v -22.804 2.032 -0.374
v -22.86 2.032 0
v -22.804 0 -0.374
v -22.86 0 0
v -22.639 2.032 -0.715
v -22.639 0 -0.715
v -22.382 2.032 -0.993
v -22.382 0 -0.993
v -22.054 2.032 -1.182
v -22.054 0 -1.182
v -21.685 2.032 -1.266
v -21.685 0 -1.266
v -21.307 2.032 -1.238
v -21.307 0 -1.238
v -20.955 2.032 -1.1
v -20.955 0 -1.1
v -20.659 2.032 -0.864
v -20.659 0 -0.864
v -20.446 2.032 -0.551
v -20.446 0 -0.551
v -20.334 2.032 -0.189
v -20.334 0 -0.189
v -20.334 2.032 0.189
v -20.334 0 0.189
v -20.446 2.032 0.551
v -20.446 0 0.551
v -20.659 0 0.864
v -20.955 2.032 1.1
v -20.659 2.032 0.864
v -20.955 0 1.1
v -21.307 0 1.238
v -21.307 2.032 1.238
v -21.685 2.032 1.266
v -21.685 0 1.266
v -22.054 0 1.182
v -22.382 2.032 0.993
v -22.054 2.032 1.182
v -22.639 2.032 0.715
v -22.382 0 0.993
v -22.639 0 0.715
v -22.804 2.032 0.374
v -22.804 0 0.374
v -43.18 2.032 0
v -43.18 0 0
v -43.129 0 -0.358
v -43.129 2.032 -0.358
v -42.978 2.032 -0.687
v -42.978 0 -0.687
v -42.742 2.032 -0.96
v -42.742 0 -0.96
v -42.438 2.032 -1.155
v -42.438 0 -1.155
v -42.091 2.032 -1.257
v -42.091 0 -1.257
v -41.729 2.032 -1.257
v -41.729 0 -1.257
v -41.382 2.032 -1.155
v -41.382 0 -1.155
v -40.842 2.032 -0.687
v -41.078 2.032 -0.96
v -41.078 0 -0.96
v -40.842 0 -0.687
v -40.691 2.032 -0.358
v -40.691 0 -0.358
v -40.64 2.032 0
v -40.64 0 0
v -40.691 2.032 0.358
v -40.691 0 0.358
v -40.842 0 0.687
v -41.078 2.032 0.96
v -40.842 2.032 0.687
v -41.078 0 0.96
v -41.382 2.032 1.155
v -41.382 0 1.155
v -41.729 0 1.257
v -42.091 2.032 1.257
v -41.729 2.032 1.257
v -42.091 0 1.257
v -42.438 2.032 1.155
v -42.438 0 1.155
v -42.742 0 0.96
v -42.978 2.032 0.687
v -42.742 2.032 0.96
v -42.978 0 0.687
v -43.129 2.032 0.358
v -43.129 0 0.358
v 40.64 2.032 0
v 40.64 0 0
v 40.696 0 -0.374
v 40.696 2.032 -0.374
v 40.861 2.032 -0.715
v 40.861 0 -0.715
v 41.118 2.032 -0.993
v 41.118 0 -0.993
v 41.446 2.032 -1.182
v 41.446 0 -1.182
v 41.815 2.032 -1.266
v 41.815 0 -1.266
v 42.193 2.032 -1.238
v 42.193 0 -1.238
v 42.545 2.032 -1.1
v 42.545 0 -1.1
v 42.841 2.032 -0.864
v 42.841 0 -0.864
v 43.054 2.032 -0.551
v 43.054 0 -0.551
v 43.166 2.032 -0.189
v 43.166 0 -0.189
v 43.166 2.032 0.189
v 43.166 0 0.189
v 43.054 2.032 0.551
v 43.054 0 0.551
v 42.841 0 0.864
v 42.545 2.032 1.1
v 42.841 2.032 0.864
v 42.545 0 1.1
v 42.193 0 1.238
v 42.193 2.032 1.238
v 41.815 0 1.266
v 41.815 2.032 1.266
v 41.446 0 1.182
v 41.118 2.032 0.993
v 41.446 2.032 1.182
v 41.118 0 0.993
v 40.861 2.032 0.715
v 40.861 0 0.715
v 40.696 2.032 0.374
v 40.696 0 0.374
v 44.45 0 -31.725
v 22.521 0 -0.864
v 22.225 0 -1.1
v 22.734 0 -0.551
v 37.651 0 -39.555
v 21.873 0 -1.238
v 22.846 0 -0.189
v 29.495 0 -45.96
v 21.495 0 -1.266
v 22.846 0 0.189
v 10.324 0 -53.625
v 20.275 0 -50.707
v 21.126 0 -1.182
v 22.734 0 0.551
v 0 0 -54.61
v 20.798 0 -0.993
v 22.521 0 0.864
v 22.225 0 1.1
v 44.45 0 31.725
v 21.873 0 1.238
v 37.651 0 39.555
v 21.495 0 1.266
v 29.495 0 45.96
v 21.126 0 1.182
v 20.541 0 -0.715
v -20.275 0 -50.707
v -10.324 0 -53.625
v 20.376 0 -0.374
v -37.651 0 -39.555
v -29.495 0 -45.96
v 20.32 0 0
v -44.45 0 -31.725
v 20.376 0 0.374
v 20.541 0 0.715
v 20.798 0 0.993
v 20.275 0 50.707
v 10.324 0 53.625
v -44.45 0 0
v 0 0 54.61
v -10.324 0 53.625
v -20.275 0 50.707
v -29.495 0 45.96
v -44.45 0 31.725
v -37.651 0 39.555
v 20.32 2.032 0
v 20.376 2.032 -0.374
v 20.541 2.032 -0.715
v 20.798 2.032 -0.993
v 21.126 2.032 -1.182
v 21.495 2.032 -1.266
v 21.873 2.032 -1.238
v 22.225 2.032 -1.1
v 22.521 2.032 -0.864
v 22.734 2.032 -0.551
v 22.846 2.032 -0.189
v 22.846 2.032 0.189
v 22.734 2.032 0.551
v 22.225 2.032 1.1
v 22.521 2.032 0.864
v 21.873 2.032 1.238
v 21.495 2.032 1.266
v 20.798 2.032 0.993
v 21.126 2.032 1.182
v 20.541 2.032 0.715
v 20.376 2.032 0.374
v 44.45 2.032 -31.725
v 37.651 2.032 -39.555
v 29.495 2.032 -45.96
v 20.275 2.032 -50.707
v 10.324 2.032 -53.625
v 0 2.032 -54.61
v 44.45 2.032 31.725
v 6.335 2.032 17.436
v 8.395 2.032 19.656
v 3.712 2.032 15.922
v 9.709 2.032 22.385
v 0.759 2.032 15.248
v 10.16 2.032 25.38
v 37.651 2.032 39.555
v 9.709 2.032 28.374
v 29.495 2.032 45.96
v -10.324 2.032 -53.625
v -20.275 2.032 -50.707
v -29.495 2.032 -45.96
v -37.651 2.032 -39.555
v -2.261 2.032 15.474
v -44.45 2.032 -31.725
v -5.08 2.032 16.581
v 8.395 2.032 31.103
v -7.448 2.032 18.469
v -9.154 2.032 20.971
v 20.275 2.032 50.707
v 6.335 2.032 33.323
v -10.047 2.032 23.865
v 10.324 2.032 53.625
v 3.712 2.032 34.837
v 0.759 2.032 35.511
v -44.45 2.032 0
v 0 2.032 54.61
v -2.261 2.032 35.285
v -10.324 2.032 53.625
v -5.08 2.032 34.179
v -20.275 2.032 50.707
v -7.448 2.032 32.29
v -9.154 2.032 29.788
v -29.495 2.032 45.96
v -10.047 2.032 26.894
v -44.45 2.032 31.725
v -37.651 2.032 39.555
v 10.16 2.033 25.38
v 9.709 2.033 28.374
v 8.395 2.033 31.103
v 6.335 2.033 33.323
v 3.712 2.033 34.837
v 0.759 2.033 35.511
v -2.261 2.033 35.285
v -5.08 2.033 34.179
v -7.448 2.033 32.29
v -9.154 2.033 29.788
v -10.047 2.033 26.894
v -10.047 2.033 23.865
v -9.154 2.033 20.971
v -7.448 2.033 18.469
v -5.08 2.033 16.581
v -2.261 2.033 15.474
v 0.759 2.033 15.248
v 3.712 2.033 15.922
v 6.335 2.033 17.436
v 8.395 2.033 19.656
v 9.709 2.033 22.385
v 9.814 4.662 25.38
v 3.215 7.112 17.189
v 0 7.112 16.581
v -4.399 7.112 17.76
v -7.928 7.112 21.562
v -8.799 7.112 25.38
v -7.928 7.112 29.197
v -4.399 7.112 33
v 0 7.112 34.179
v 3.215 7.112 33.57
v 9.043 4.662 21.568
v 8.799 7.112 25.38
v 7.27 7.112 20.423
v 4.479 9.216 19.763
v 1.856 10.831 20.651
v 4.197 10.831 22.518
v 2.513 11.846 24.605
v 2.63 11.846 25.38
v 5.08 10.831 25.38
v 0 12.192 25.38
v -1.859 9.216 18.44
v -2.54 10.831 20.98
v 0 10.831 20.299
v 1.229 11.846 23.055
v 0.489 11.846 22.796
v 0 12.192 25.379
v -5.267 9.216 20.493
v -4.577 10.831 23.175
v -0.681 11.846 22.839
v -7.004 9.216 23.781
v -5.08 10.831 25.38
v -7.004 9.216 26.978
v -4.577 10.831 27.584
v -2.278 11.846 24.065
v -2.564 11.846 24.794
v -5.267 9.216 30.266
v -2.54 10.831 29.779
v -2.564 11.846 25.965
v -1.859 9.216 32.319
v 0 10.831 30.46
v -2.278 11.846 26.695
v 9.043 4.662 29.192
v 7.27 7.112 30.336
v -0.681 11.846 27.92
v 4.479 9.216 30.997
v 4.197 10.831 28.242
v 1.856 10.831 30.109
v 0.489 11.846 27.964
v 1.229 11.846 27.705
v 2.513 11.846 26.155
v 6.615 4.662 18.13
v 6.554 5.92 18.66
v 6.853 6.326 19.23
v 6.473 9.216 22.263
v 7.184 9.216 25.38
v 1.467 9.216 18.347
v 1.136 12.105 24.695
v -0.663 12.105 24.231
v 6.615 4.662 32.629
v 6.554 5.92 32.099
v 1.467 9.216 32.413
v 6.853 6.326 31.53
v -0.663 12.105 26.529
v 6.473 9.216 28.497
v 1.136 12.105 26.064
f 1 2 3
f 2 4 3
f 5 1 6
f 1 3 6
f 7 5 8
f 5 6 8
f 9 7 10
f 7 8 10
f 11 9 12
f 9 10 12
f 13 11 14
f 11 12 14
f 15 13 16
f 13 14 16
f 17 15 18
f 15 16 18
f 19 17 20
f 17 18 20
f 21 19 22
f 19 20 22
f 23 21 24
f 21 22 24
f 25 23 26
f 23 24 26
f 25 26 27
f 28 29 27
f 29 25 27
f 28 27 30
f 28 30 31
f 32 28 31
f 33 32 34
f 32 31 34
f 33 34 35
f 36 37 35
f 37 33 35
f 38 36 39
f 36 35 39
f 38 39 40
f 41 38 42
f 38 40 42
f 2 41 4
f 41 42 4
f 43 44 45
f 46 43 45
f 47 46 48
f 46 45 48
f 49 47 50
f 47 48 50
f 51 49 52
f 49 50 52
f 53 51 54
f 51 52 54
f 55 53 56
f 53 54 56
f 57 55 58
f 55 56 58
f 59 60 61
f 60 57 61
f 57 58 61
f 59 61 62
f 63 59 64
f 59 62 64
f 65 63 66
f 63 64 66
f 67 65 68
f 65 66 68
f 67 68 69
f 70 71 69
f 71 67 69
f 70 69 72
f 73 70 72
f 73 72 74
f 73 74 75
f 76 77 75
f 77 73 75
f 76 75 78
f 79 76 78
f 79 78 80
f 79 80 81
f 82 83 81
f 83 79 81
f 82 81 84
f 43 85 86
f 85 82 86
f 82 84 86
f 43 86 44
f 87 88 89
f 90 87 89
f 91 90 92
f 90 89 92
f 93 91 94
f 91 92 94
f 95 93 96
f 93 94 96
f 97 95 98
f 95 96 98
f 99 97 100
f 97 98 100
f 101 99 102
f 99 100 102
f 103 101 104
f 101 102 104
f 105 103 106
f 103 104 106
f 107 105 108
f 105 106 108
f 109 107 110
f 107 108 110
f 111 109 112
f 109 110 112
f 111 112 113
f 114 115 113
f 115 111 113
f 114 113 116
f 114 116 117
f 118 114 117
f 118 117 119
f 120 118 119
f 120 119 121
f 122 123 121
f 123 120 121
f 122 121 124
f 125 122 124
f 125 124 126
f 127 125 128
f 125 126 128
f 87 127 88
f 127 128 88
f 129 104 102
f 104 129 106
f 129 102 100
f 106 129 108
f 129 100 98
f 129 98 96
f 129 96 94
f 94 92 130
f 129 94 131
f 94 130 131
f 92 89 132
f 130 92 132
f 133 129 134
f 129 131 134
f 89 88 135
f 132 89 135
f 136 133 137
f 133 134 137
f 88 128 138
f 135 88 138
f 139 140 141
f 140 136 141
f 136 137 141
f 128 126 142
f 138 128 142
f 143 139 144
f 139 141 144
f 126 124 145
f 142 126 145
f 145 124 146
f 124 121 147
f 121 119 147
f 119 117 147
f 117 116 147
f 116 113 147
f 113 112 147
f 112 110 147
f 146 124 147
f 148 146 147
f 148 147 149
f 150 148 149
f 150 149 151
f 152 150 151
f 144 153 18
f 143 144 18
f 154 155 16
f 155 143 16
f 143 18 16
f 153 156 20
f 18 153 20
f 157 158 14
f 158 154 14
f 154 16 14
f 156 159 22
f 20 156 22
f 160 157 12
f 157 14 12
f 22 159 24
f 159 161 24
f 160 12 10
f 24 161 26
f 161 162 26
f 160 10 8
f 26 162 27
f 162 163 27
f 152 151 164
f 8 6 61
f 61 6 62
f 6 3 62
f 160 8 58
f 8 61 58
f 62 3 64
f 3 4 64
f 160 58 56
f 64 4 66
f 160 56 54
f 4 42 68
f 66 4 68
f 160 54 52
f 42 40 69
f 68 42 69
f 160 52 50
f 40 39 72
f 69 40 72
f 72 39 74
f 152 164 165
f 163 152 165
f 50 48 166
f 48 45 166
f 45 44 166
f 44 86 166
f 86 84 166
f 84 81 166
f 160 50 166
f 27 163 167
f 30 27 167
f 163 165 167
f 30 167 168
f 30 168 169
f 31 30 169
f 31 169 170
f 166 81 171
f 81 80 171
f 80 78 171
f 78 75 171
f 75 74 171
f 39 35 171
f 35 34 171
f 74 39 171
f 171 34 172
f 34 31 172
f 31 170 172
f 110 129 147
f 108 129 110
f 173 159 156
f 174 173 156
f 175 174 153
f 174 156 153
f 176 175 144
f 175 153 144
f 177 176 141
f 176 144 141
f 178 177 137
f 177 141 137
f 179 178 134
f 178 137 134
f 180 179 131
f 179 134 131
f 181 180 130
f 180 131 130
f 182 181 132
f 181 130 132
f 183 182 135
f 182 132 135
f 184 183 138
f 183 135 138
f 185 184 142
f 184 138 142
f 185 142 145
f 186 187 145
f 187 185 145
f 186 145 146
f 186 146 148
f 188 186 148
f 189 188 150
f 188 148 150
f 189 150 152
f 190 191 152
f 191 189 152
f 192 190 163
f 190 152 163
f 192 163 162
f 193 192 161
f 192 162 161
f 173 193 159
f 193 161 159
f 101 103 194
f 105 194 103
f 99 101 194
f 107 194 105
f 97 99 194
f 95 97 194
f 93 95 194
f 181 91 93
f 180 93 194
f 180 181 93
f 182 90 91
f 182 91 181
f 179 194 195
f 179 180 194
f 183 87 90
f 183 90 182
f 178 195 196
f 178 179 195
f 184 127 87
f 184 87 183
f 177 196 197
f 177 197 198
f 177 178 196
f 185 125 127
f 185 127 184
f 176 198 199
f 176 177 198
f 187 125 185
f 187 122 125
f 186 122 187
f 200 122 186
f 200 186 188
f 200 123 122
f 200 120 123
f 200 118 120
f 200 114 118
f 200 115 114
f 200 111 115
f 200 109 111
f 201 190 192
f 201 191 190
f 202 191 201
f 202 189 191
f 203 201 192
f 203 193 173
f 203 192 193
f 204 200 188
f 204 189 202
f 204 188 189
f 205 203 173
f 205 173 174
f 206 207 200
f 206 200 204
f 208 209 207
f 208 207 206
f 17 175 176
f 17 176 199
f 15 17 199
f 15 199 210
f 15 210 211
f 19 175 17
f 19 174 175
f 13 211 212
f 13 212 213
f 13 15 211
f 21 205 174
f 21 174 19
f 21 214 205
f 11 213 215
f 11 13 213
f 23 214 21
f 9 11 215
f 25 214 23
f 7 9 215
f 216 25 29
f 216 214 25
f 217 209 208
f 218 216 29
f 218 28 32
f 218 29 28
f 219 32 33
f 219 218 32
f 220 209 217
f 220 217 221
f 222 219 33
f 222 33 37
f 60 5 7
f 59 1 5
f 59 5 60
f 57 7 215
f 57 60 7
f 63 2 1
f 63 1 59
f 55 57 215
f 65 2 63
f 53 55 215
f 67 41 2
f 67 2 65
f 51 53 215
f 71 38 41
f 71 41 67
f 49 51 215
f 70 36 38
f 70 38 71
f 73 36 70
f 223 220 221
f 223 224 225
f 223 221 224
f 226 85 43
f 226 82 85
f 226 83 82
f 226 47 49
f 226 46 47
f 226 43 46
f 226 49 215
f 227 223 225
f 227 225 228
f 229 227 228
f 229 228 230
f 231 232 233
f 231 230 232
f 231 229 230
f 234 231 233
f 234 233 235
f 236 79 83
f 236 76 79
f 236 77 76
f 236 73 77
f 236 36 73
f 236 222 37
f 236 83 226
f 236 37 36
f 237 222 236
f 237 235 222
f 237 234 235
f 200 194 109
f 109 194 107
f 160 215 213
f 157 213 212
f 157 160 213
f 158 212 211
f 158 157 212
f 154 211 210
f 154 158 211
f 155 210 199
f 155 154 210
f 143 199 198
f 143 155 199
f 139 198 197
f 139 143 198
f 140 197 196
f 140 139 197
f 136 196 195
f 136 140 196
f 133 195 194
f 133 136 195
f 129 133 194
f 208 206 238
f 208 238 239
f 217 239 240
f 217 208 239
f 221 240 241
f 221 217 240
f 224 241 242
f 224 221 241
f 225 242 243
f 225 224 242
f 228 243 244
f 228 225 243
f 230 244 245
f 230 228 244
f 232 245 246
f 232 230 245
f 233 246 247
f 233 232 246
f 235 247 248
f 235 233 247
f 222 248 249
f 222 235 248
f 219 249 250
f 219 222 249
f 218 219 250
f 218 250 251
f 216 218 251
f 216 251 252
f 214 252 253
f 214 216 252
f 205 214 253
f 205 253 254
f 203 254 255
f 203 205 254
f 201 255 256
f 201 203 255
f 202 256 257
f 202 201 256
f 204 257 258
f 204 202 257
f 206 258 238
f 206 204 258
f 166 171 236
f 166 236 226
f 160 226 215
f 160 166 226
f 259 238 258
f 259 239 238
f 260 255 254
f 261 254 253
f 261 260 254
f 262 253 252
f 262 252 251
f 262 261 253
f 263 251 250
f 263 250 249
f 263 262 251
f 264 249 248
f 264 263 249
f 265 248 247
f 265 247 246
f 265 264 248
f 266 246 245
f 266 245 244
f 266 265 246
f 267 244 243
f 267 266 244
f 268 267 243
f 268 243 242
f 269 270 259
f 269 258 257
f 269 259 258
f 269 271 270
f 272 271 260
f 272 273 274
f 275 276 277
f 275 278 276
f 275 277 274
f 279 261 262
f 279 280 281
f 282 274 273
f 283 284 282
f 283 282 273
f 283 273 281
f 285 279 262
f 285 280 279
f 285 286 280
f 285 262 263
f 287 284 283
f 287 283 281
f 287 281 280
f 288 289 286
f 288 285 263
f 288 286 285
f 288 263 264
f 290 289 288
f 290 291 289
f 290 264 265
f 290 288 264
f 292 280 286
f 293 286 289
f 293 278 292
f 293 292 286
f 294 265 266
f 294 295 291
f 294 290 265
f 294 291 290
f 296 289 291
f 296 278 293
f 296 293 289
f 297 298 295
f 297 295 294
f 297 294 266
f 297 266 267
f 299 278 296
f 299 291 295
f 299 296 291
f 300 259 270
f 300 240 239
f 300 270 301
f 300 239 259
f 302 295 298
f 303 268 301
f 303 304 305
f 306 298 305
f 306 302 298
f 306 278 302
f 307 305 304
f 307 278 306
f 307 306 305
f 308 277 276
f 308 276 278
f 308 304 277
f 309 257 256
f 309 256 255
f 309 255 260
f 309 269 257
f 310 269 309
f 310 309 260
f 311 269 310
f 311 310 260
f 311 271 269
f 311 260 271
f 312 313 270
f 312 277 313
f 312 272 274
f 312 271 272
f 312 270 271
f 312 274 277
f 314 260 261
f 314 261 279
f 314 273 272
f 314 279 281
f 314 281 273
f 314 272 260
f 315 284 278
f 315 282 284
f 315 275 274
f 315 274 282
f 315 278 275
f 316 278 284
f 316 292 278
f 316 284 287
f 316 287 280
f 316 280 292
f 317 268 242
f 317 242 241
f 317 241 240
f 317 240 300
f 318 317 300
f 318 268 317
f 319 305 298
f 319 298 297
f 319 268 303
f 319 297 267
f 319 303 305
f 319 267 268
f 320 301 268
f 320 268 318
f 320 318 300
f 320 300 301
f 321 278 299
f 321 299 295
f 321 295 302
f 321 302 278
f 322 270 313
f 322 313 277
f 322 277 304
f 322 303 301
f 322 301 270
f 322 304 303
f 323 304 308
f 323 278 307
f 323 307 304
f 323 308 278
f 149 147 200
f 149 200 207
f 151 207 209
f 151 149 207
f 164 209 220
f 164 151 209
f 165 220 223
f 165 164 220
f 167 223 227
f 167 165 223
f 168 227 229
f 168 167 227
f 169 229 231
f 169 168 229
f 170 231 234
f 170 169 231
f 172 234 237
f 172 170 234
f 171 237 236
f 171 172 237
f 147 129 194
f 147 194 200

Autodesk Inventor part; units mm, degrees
ref_plane "YZ Plane" through (0, 0, 0) normal (1, 0, 0) x (0, 1, 0)
ref_plane "XZ Plane" through (0, 0, 0) normal (0, 1, 0) x (-1, 0, 0)
ref_plane "XY Plane" through (0, 0, 0) normal (0, 0, 1) x (1, 0, 0)
sketch "Sketch1" plane through (0, 0, 0) normal (0, 1, 0) x (-1, 0, 0)
  line L0 (44.45, 31.7246) -> (44.45, -31.7246)
  line L1 (-44.45, -31.7246) -> (-44.45, 31.7246)
  arc A0 (-44.45, -31.7246) -> (44.45, -31.7246) centre (0, 0) ccw
  arc A1 (44.45, 31.7246) -> (-44.45, 31.7246) centre (0, 0) ccw
  line L2 (44.45, 0) -> (41.91, 0)
  circle A2 centre (41.91, 0) radius 1.27
  line L3 (41.91, 0) -> (21.59, 0)
  circle A3 centre (21.59, 0) radius 1.27
  line L4 (0, -54.61) -> (0, 54.61)
  circle A4 centre (-41.91, 0) radius 1.27
  circle A5 centre (-21.59, 0) radius 1.27
  dimension "d3" = 88.9
  dimension "d4" = 2.54
  dimension "d5" = 2.54
  dimension "d6" = 20.32
  dimension "d7" = 2.54
extrude "Extrusion1" add sketch "Sketch1" along normal blind 2.032
sketch "Sketch2" plane through (0, 2.032, 0) normal (0, 1, 0) x (1, 0, 0)
  circle A0 centre (0, -25.3797) radius 10.16
  point P0 (0, 0)
  dimension "d10" = 20.32
extrude "Extrusion2" add sketch "Sketch2" along normal blind 10.16
fillet "Fillet1" radius 10.16 1 edges at (-10.16, 12.192, 25.3797)
properties part number "Base Plate"
